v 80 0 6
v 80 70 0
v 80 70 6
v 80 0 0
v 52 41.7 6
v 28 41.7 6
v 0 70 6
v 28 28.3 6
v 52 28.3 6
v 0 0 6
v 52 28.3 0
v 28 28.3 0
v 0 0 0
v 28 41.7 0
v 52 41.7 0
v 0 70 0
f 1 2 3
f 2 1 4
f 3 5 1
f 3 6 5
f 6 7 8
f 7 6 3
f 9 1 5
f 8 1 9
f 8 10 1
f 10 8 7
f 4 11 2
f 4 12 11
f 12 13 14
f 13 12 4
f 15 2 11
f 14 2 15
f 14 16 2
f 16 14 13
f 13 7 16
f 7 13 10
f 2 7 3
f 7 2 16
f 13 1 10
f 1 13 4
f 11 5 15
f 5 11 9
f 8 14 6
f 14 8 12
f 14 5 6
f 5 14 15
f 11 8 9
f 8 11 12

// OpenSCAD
module pt_bracket() {
  w=80.0; h=70.0; t=6.0;
  difference() {
    cube([w,h,t], center=false);
    translate([(w-22.8-2*0.6)/2, (h-12.2-2*0.6)/2, -1])
      cube([22.8+2*0.6, 12.2+2*0.6, t+2], center=false);
  }
}
pt_bracket();
